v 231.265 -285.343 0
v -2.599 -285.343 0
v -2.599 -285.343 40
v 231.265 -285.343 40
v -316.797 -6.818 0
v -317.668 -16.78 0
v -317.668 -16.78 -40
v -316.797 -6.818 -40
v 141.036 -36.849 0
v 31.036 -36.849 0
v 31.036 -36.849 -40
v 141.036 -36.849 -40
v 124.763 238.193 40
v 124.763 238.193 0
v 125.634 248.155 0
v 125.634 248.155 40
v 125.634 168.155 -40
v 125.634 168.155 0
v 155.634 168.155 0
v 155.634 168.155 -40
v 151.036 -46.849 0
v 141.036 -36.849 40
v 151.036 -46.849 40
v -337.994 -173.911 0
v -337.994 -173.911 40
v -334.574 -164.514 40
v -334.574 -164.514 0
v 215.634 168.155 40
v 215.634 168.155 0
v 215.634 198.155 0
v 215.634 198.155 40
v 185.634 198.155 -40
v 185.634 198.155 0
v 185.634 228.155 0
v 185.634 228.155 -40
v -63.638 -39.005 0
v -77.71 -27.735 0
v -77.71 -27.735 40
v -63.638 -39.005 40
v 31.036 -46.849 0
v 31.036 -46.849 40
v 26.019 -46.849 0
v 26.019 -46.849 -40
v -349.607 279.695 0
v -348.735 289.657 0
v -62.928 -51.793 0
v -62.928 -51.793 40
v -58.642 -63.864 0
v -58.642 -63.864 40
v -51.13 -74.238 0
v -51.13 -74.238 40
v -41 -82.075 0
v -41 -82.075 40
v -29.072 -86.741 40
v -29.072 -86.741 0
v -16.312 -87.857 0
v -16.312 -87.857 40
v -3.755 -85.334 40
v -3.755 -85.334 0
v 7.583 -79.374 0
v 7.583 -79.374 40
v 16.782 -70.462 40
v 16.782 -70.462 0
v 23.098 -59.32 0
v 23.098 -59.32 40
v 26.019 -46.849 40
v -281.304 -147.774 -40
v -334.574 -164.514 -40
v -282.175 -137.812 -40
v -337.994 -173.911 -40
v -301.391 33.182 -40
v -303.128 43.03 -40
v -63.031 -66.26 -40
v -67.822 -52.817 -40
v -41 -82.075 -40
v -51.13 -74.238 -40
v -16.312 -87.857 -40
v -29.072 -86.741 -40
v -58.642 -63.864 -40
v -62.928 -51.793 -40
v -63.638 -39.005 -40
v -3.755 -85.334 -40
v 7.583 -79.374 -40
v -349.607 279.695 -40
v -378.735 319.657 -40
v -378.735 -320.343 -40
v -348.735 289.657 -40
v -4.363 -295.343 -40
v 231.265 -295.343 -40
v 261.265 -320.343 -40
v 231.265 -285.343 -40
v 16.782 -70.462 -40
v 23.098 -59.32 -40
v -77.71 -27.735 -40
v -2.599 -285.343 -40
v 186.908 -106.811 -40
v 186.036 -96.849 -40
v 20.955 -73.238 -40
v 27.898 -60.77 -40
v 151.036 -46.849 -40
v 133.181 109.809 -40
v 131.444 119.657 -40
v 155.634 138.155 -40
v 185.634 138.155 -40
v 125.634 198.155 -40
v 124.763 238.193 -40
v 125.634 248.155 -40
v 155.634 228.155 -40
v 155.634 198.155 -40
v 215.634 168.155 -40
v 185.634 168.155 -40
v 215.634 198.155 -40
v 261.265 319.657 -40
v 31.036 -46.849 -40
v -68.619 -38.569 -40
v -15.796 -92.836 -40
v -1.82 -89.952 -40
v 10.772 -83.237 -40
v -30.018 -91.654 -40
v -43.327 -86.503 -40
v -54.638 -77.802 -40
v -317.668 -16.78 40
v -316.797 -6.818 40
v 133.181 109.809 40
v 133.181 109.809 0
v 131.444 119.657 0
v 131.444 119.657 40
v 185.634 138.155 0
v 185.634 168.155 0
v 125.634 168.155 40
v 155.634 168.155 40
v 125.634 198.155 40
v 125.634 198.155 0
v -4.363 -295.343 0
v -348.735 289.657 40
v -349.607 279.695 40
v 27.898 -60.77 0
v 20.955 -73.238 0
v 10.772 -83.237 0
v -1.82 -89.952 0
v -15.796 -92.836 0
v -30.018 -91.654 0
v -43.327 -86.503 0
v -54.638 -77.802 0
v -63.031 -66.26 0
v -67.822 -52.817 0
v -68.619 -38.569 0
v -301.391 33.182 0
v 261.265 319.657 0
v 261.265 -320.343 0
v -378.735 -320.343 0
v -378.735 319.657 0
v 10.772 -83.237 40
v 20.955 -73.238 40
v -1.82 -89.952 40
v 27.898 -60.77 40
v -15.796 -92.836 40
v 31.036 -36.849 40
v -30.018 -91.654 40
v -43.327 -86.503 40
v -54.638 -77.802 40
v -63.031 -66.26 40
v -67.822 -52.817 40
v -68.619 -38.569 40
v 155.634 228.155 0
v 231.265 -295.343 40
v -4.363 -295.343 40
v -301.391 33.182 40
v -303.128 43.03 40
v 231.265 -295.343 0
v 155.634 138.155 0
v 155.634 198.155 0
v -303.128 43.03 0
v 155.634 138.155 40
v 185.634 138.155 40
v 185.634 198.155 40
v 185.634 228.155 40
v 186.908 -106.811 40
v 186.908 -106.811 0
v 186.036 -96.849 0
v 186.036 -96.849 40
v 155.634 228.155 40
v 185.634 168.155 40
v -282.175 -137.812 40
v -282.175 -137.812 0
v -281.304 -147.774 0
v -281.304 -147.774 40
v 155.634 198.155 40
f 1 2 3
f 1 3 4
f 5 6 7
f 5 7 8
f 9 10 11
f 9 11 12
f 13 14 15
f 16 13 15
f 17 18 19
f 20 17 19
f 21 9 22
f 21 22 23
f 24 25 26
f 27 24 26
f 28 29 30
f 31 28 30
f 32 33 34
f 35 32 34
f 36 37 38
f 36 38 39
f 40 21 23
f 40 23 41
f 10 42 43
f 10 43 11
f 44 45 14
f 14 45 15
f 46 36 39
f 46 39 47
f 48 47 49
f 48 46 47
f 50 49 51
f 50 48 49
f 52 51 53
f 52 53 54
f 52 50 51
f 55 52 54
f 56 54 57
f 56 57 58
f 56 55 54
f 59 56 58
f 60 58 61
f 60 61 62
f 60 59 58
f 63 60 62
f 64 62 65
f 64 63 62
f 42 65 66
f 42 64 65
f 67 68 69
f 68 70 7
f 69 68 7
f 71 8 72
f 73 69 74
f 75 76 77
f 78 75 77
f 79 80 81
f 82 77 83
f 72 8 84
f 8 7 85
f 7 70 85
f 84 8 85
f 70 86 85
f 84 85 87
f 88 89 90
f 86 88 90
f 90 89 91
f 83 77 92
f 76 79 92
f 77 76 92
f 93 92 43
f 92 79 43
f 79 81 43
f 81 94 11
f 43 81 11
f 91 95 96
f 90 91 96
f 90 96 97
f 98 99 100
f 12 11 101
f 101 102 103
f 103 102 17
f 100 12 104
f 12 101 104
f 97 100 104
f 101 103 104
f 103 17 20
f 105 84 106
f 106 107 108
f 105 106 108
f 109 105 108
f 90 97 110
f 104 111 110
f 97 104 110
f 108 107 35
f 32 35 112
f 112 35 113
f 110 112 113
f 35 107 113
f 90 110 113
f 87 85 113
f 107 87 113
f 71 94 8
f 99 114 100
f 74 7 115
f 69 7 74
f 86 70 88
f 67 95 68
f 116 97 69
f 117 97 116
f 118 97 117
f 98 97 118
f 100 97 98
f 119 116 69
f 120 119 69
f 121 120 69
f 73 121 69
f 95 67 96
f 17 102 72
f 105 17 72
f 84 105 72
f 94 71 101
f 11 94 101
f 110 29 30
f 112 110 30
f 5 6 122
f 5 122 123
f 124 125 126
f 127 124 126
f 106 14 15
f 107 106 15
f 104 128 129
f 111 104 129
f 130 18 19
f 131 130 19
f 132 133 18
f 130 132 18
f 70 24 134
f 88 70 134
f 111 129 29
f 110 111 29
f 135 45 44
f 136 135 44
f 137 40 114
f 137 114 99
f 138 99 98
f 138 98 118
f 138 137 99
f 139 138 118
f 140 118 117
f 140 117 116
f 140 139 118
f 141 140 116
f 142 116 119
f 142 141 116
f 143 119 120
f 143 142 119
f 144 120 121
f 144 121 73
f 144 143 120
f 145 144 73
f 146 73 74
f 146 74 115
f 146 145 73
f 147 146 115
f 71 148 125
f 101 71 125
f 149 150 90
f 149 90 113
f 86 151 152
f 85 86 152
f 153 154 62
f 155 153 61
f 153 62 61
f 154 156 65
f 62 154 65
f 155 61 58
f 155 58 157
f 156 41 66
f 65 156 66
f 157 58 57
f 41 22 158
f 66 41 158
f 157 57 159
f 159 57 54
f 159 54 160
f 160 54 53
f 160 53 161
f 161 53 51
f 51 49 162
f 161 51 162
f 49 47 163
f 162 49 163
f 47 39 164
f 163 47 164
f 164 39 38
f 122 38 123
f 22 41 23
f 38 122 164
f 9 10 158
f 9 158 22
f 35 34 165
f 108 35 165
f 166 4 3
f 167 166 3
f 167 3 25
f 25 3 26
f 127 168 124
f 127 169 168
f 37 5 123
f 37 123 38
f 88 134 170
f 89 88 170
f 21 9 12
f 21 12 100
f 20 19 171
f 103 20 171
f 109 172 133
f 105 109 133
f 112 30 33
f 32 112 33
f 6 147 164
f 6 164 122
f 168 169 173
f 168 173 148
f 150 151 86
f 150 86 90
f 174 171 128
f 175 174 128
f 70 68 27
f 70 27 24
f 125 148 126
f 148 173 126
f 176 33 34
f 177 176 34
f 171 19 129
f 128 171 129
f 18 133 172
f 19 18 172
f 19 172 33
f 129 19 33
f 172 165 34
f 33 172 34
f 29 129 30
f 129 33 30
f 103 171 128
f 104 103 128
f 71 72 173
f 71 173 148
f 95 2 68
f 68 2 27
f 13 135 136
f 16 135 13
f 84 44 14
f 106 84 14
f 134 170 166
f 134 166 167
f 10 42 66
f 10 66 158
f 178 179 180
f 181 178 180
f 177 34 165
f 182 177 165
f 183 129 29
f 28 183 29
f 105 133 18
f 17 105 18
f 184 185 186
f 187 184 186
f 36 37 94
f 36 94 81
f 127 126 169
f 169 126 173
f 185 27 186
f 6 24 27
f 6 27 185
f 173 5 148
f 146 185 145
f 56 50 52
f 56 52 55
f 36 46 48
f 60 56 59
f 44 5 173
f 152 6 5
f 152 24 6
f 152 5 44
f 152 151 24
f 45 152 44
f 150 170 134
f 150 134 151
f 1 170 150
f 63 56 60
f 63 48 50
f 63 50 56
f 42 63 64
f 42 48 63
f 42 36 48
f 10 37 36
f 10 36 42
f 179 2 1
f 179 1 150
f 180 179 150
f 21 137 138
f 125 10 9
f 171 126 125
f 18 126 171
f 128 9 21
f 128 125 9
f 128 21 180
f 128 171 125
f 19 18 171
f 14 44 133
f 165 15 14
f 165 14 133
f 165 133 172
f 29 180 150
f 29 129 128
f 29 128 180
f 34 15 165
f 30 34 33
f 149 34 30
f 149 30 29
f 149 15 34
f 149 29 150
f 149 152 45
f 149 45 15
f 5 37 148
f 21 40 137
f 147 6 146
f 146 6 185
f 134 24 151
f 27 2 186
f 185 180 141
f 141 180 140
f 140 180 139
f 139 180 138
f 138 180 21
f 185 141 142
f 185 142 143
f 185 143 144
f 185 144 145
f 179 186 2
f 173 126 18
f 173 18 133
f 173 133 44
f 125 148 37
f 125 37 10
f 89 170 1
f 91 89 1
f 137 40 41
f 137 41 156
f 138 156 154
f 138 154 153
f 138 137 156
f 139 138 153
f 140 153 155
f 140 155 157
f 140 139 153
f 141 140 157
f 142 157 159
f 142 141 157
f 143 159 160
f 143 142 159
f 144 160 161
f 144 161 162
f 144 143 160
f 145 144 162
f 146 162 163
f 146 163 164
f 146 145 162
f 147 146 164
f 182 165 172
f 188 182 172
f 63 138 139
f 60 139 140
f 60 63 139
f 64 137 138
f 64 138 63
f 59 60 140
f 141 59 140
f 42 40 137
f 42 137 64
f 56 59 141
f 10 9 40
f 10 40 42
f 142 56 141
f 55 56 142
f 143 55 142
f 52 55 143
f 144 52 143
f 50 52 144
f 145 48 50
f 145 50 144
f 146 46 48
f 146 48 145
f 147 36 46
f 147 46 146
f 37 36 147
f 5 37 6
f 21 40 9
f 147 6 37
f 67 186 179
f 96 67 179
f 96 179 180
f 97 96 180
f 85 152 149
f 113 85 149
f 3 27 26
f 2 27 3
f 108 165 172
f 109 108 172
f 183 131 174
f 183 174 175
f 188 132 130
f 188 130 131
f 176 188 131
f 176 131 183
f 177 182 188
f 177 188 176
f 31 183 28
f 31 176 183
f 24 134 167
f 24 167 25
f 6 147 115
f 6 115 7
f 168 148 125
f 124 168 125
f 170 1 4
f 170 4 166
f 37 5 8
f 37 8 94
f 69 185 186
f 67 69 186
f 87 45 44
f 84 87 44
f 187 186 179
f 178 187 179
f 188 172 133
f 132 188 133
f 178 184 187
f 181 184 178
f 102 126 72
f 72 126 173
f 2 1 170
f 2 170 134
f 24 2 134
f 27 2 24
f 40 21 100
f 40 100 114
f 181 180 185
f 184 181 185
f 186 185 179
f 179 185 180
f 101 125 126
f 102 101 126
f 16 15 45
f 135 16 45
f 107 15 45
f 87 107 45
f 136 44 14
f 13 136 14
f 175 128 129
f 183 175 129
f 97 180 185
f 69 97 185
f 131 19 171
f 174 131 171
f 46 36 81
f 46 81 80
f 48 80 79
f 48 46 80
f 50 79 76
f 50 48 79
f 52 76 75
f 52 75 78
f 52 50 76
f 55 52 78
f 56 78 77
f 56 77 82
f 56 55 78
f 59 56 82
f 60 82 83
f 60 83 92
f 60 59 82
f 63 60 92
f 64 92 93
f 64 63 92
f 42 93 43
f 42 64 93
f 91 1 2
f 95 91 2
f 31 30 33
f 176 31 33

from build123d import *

# Parameters (mm, degrees)
BOSS_EXTRUDE2_DEPTH   = 40
BOSS_EXTRUDE2_2_DEPTH = 40
BOSS_EXTRUDE2_3_DEPTH = 40
BOSS_EXTRUDE2_4_DEPTH = 40
BOSS_EXTRUDE2_5_DEPTH = 40
BOSS_EXTRUDE2_6_DEPTH = 40
SKETCH1_4_W           = 640
SKETCH1_4_H           = 640
BOSS_EXTRUDE3_DEPTH   = 40


with BuildPart() as part:
    # Sketch1 → Boss-Extrude2 (new body)
    with BuildSketch(Plane.XY):
        Polygon((125.634221906, 248.154756102), (-348.735472044, 289.656726643), (-349.607029472, 279.694779662), (124.762664478, 238.192809121), align=None)
    extrude(amount=BOSS_EXTRUDE2_DEPTH)


with BuildPart() as body_2:
    # Sketch1 → Boss-Extrude2 2 (new body)
    with BuildSketch(Plane.XY):
        Polygon((155.634221906, 198.154756102), (125.634221906, 198.154756102), (125.634221906, 168.154756102), (155.634221906, 168.154756102), (155.634221906, 138.154756102), (185.634221906, 138.154756102), (185.634221906, 168.154756102), (215.634221906, 168.154756102), (215.634221906, 198.154756102), (185.634221906, 198.154756102), (185.634221906, 228.154756102), (155.634221906, 228.154756102), align=None)
    extrude(amount=BOSS_EXTRUDE2_2_DEPTH)


with BuildPart() as body_3:
    # Sketch1 → Boss-Extrude2 3 (new body)
    with BuildSketch(Plane.XY):
        Polygon((133.180509115, 109.808649113), (131.444027338, 119.656726643), (-303.127612508, 43.030021487), (-301.391130731, 33.181943957), align=None)
    extrude(amount=BOSS_EXTRUDE2_3_DEPTH)


with BuildPart() as body_4:
    # Sketch1 → Boss-Extrude2 4 (new body)
    with BuildSketch(Plane.XY):
        with BuildLine():
            Line((-77.709800851, -27.735434302), (-316.796528393, -6.818056043))
            Line((-316.796528393, -6.818056043), (-317.668085821, -16.780003024))
            Line((-317.668085821, -16.780003024), (-68.619411298, -38.568938711))
            ThreePointArc((-68.619411298, -38.568938711), (-22.949613754, -92.755040275), (31.036264765, -46.848734272))
            Line((31.036264765, -46.848734272), (151.036264765, -46.848734272))
            Line((151.036264765, -46.848734272), (141.036264765, -36.848734272))
            Line((141.036264765, -36.848734272), (31.036264765, -36.848734272))
            Line((31.036264765, -36.848734272), (26.019085021, -46.848734272))
            ThreePointArc((26.019085021, -46.848734272), (-22.731684817, -87.755487262), (-63.638437807, -39.004717424))
            Line((-63.638437807, -39.004717424), (-77.709800851, -27.735434302))
        make_face()
    extrude(amount=BOSS_EXTRUDE2_4_DEPTH)


with BuildPart() as body_5:
    # Sketch1 → Boss-Extrude2 5 (new body)
    with BuildSketch(Plane.XY):
        Polygon((186.907822192, -106.810681252), (186.036264765, -96.848734272), (-282.175243338, -137.811933363), (-281.303685911, -147.773880344), align=None)
    extrude(amount=BOSS_EXTRUDE2_5_DEPTH)


with BuildPart() as body_6:
    # Sketch1 → Boss-Extrude2 6 (new body)
    with BuildSketch(Plane.XY):
        Polygon((-2.599325132, -285.343273357), (-334.573935055, -164.514396813), (-337.994136488, -173.911323021), (-4.362594939, -295.343273357), (231.264527956, -295.343273357), (231.264527956, -285.343273357), align=None)
    extrude(amount=BOSS_EXTRUDE2_6_DEPTH)


with BuildPart() as body_7:
    # Sketch1<4> → Boss-Extrude3 (new body)
    with BuildSketch(Plane.XY):
        with Locations((-58.735472044, -0.343273357)):
            Rectangle(SKETCH1_4_W, SKETCH1_4_H)
        with BuildLine():
            Line((-317.668085821, -16.780003024), (-316.796528393, -6.818056043))
            Line((-316.796528393, -6.818056043), (-77.709800851, -27.735434302))
            Line((-77.709800851, -27.735434302), (-63.638437807, -39.004717424))
            ThreePointArc((-63.638437807, -39.004717424), (-22.731684817, -87.755487262), (26.019085021, -46.848734272))
            Line((26.019085021, -46.848734272), (31.036264765, -36.848734272))
            Line((31.036264765, -36.848734272), (141.036264765, -36.848734272))
            Line((141.036264765, -36.848734272), (151.036264765, -46.848734272))
            Line((151.036264765, -46.848734272), (31.036264765, -46.848734272))
            ThreePointArc((31.036264765, -46.848734272), (-22.949613754, -92.755040275), (-68.619411298, -38.568938711))
            Line((-68.619411298, -38.568938711), (-317.668085821, -16.780003024))
        make_face(mode=Mode.SUBTRACT)
        Polygon((-337.994136488, -173.911323021), (-334.573935055, -164.514396813), (-2.599325132, -285.343273357), (231.264527956, -285.343273357), (231.264527956, -295.343273357), (-4.362594939, -295.343273357), align=None, mode=Mode.SUBTRACT)
        Polygon((-282.175243338, -137.811933363), (186.036264765, -96.848734272), (186.907822192, -106.810681252), (-281.303685911, -147.773880344), align=None, mode=Mode.SUBTRACT)
        Polygon((-303.127612508, 43.030021487), (131.444027338, 119.656726643), (133.180509115, 109.808649113), (-301.391130731, 33.181943957), align=None, mode=Mode.SUBTRACT)
        Polygon((-349.607029472, 279.694779662), (-348.735472044, 289.656726643), (125.634221906, 248.154756102), (124.762664478, 238.192809121), align=None, mode=Mode.SUBTRACT)
        Polygon((125.634221906, 168.154756102), (125.634221906, 198.154756102), (155.634221906, 198.154756102), (155.634221906, 228.154756102), (185.634221906, 228.154756102), (185.634221906, 198.154756102), (215.634221906, 198.154756102), (215.634221906, 168.154756102), (185.634221906, 168.154756102), (185.634221906, 138.154756102), (155.634221906, 138.154756102), (155.634221906, 168.154756102), align=None, mode=Mode.SUBTRACT)
    extrude(amount=-BOSS_EXTRUDE3_DEPTH)


solid = Compound([part.part, body_2.part, body_3.part, body_4.part, body_5.part, body_6.part, body_7.part])
